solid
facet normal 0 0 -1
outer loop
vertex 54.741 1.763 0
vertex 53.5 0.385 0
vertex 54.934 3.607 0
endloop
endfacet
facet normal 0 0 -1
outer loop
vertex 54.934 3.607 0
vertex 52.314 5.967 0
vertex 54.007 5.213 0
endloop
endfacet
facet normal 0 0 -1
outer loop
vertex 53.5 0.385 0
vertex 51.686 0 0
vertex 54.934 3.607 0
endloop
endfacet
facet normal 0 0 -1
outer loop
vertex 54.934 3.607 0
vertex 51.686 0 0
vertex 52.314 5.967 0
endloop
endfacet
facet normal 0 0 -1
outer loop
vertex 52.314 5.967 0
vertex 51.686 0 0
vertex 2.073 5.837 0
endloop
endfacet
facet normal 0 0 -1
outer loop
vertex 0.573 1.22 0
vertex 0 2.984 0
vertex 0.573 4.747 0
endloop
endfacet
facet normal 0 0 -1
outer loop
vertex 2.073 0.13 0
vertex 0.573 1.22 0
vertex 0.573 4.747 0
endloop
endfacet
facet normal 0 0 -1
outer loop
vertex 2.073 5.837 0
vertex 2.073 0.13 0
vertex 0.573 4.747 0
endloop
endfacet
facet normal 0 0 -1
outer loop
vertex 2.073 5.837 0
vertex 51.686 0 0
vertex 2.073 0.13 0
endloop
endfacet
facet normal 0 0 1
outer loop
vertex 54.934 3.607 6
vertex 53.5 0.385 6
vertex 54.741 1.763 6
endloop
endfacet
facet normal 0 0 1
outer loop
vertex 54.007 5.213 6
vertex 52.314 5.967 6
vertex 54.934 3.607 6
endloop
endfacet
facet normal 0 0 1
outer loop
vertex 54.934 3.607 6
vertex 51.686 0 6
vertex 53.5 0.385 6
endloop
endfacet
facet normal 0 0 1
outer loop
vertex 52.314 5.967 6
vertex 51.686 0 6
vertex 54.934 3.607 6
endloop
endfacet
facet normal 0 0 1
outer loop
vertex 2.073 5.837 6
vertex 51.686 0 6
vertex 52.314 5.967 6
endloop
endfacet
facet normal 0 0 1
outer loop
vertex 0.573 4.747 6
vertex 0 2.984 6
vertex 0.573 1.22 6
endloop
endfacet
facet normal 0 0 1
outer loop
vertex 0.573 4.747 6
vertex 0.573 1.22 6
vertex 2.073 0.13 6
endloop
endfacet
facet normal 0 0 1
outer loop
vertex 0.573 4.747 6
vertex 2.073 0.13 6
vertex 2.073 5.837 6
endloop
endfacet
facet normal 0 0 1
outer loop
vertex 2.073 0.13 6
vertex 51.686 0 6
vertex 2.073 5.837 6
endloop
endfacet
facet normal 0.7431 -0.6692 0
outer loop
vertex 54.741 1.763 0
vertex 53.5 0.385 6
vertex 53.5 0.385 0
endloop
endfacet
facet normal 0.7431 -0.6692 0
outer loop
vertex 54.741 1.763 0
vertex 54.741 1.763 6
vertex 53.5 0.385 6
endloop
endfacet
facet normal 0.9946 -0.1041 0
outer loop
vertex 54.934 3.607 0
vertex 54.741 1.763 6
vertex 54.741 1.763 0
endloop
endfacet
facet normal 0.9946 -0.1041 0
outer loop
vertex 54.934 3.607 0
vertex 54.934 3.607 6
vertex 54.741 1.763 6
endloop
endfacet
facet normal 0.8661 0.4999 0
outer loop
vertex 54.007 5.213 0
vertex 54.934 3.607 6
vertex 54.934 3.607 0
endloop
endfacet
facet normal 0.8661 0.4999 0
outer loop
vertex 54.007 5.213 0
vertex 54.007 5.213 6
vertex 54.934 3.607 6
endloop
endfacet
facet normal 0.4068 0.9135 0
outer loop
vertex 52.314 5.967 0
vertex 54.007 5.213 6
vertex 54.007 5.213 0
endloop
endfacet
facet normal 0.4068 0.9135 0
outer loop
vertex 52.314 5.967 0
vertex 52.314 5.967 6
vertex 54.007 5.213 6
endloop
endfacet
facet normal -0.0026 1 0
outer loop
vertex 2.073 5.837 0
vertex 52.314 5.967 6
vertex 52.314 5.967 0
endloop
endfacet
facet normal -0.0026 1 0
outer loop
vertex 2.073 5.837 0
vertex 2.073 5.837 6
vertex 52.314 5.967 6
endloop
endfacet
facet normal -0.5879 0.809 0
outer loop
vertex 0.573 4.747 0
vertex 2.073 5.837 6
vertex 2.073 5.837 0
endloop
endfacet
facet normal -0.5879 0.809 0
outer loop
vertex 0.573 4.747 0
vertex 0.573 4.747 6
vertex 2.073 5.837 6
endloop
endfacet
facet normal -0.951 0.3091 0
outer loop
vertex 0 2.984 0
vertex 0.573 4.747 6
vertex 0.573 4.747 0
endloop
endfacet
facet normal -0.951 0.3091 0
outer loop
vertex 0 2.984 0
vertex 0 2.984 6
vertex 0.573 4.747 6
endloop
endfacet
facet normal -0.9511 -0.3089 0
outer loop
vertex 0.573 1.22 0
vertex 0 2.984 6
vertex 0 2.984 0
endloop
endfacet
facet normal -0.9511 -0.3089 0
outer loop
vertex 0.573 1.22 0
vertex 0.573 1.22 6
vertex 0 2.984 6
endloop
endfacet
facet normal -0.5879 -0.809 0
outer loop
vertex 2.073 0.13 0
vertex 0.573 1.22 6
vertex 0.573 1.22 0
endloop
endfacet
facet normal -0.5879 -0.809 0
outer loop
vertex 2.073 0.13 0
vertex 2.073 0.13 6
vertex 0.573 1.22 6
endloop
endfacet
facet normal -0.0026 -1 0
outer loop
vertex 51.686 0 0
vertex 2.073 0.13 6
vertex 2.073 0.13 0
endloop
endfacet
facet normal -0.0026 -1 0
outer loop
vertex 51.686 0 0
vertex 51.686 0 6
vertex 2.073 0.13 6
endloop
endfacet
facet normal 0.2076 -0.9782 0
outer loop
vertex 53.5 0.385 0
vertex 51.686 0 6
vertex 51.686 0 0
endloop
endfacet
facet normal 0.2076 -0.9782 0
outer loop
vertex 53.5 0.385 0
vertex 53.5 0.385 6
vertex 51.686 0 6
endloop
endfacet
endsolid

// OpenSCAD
$fn = 32;

// ----------------------------------------------------------------------
// Key bar: parallel key, 6 mm thick
// ----------------------------------------------------------------------

// --- parameters (mm) ---
profile_height = 6;       // extrusion height
profile_points = 11;      // points of the closed outline

profile = [[0, 2.984], [0.573, 1.22], [2.073, 0.13], [51.686, 0], [53.5, 0.385], [54.741, 1.763], [54.934, 3.607], [54.007, 5.213], [52.314, 5.967], [2.073, 5.837], [0.573, 4.747]];  // single closed polygon, 11 points, counter clockwise

// --- the one profile operation ---
linear_extrude(height = profile_height) polygon(points = profile);
